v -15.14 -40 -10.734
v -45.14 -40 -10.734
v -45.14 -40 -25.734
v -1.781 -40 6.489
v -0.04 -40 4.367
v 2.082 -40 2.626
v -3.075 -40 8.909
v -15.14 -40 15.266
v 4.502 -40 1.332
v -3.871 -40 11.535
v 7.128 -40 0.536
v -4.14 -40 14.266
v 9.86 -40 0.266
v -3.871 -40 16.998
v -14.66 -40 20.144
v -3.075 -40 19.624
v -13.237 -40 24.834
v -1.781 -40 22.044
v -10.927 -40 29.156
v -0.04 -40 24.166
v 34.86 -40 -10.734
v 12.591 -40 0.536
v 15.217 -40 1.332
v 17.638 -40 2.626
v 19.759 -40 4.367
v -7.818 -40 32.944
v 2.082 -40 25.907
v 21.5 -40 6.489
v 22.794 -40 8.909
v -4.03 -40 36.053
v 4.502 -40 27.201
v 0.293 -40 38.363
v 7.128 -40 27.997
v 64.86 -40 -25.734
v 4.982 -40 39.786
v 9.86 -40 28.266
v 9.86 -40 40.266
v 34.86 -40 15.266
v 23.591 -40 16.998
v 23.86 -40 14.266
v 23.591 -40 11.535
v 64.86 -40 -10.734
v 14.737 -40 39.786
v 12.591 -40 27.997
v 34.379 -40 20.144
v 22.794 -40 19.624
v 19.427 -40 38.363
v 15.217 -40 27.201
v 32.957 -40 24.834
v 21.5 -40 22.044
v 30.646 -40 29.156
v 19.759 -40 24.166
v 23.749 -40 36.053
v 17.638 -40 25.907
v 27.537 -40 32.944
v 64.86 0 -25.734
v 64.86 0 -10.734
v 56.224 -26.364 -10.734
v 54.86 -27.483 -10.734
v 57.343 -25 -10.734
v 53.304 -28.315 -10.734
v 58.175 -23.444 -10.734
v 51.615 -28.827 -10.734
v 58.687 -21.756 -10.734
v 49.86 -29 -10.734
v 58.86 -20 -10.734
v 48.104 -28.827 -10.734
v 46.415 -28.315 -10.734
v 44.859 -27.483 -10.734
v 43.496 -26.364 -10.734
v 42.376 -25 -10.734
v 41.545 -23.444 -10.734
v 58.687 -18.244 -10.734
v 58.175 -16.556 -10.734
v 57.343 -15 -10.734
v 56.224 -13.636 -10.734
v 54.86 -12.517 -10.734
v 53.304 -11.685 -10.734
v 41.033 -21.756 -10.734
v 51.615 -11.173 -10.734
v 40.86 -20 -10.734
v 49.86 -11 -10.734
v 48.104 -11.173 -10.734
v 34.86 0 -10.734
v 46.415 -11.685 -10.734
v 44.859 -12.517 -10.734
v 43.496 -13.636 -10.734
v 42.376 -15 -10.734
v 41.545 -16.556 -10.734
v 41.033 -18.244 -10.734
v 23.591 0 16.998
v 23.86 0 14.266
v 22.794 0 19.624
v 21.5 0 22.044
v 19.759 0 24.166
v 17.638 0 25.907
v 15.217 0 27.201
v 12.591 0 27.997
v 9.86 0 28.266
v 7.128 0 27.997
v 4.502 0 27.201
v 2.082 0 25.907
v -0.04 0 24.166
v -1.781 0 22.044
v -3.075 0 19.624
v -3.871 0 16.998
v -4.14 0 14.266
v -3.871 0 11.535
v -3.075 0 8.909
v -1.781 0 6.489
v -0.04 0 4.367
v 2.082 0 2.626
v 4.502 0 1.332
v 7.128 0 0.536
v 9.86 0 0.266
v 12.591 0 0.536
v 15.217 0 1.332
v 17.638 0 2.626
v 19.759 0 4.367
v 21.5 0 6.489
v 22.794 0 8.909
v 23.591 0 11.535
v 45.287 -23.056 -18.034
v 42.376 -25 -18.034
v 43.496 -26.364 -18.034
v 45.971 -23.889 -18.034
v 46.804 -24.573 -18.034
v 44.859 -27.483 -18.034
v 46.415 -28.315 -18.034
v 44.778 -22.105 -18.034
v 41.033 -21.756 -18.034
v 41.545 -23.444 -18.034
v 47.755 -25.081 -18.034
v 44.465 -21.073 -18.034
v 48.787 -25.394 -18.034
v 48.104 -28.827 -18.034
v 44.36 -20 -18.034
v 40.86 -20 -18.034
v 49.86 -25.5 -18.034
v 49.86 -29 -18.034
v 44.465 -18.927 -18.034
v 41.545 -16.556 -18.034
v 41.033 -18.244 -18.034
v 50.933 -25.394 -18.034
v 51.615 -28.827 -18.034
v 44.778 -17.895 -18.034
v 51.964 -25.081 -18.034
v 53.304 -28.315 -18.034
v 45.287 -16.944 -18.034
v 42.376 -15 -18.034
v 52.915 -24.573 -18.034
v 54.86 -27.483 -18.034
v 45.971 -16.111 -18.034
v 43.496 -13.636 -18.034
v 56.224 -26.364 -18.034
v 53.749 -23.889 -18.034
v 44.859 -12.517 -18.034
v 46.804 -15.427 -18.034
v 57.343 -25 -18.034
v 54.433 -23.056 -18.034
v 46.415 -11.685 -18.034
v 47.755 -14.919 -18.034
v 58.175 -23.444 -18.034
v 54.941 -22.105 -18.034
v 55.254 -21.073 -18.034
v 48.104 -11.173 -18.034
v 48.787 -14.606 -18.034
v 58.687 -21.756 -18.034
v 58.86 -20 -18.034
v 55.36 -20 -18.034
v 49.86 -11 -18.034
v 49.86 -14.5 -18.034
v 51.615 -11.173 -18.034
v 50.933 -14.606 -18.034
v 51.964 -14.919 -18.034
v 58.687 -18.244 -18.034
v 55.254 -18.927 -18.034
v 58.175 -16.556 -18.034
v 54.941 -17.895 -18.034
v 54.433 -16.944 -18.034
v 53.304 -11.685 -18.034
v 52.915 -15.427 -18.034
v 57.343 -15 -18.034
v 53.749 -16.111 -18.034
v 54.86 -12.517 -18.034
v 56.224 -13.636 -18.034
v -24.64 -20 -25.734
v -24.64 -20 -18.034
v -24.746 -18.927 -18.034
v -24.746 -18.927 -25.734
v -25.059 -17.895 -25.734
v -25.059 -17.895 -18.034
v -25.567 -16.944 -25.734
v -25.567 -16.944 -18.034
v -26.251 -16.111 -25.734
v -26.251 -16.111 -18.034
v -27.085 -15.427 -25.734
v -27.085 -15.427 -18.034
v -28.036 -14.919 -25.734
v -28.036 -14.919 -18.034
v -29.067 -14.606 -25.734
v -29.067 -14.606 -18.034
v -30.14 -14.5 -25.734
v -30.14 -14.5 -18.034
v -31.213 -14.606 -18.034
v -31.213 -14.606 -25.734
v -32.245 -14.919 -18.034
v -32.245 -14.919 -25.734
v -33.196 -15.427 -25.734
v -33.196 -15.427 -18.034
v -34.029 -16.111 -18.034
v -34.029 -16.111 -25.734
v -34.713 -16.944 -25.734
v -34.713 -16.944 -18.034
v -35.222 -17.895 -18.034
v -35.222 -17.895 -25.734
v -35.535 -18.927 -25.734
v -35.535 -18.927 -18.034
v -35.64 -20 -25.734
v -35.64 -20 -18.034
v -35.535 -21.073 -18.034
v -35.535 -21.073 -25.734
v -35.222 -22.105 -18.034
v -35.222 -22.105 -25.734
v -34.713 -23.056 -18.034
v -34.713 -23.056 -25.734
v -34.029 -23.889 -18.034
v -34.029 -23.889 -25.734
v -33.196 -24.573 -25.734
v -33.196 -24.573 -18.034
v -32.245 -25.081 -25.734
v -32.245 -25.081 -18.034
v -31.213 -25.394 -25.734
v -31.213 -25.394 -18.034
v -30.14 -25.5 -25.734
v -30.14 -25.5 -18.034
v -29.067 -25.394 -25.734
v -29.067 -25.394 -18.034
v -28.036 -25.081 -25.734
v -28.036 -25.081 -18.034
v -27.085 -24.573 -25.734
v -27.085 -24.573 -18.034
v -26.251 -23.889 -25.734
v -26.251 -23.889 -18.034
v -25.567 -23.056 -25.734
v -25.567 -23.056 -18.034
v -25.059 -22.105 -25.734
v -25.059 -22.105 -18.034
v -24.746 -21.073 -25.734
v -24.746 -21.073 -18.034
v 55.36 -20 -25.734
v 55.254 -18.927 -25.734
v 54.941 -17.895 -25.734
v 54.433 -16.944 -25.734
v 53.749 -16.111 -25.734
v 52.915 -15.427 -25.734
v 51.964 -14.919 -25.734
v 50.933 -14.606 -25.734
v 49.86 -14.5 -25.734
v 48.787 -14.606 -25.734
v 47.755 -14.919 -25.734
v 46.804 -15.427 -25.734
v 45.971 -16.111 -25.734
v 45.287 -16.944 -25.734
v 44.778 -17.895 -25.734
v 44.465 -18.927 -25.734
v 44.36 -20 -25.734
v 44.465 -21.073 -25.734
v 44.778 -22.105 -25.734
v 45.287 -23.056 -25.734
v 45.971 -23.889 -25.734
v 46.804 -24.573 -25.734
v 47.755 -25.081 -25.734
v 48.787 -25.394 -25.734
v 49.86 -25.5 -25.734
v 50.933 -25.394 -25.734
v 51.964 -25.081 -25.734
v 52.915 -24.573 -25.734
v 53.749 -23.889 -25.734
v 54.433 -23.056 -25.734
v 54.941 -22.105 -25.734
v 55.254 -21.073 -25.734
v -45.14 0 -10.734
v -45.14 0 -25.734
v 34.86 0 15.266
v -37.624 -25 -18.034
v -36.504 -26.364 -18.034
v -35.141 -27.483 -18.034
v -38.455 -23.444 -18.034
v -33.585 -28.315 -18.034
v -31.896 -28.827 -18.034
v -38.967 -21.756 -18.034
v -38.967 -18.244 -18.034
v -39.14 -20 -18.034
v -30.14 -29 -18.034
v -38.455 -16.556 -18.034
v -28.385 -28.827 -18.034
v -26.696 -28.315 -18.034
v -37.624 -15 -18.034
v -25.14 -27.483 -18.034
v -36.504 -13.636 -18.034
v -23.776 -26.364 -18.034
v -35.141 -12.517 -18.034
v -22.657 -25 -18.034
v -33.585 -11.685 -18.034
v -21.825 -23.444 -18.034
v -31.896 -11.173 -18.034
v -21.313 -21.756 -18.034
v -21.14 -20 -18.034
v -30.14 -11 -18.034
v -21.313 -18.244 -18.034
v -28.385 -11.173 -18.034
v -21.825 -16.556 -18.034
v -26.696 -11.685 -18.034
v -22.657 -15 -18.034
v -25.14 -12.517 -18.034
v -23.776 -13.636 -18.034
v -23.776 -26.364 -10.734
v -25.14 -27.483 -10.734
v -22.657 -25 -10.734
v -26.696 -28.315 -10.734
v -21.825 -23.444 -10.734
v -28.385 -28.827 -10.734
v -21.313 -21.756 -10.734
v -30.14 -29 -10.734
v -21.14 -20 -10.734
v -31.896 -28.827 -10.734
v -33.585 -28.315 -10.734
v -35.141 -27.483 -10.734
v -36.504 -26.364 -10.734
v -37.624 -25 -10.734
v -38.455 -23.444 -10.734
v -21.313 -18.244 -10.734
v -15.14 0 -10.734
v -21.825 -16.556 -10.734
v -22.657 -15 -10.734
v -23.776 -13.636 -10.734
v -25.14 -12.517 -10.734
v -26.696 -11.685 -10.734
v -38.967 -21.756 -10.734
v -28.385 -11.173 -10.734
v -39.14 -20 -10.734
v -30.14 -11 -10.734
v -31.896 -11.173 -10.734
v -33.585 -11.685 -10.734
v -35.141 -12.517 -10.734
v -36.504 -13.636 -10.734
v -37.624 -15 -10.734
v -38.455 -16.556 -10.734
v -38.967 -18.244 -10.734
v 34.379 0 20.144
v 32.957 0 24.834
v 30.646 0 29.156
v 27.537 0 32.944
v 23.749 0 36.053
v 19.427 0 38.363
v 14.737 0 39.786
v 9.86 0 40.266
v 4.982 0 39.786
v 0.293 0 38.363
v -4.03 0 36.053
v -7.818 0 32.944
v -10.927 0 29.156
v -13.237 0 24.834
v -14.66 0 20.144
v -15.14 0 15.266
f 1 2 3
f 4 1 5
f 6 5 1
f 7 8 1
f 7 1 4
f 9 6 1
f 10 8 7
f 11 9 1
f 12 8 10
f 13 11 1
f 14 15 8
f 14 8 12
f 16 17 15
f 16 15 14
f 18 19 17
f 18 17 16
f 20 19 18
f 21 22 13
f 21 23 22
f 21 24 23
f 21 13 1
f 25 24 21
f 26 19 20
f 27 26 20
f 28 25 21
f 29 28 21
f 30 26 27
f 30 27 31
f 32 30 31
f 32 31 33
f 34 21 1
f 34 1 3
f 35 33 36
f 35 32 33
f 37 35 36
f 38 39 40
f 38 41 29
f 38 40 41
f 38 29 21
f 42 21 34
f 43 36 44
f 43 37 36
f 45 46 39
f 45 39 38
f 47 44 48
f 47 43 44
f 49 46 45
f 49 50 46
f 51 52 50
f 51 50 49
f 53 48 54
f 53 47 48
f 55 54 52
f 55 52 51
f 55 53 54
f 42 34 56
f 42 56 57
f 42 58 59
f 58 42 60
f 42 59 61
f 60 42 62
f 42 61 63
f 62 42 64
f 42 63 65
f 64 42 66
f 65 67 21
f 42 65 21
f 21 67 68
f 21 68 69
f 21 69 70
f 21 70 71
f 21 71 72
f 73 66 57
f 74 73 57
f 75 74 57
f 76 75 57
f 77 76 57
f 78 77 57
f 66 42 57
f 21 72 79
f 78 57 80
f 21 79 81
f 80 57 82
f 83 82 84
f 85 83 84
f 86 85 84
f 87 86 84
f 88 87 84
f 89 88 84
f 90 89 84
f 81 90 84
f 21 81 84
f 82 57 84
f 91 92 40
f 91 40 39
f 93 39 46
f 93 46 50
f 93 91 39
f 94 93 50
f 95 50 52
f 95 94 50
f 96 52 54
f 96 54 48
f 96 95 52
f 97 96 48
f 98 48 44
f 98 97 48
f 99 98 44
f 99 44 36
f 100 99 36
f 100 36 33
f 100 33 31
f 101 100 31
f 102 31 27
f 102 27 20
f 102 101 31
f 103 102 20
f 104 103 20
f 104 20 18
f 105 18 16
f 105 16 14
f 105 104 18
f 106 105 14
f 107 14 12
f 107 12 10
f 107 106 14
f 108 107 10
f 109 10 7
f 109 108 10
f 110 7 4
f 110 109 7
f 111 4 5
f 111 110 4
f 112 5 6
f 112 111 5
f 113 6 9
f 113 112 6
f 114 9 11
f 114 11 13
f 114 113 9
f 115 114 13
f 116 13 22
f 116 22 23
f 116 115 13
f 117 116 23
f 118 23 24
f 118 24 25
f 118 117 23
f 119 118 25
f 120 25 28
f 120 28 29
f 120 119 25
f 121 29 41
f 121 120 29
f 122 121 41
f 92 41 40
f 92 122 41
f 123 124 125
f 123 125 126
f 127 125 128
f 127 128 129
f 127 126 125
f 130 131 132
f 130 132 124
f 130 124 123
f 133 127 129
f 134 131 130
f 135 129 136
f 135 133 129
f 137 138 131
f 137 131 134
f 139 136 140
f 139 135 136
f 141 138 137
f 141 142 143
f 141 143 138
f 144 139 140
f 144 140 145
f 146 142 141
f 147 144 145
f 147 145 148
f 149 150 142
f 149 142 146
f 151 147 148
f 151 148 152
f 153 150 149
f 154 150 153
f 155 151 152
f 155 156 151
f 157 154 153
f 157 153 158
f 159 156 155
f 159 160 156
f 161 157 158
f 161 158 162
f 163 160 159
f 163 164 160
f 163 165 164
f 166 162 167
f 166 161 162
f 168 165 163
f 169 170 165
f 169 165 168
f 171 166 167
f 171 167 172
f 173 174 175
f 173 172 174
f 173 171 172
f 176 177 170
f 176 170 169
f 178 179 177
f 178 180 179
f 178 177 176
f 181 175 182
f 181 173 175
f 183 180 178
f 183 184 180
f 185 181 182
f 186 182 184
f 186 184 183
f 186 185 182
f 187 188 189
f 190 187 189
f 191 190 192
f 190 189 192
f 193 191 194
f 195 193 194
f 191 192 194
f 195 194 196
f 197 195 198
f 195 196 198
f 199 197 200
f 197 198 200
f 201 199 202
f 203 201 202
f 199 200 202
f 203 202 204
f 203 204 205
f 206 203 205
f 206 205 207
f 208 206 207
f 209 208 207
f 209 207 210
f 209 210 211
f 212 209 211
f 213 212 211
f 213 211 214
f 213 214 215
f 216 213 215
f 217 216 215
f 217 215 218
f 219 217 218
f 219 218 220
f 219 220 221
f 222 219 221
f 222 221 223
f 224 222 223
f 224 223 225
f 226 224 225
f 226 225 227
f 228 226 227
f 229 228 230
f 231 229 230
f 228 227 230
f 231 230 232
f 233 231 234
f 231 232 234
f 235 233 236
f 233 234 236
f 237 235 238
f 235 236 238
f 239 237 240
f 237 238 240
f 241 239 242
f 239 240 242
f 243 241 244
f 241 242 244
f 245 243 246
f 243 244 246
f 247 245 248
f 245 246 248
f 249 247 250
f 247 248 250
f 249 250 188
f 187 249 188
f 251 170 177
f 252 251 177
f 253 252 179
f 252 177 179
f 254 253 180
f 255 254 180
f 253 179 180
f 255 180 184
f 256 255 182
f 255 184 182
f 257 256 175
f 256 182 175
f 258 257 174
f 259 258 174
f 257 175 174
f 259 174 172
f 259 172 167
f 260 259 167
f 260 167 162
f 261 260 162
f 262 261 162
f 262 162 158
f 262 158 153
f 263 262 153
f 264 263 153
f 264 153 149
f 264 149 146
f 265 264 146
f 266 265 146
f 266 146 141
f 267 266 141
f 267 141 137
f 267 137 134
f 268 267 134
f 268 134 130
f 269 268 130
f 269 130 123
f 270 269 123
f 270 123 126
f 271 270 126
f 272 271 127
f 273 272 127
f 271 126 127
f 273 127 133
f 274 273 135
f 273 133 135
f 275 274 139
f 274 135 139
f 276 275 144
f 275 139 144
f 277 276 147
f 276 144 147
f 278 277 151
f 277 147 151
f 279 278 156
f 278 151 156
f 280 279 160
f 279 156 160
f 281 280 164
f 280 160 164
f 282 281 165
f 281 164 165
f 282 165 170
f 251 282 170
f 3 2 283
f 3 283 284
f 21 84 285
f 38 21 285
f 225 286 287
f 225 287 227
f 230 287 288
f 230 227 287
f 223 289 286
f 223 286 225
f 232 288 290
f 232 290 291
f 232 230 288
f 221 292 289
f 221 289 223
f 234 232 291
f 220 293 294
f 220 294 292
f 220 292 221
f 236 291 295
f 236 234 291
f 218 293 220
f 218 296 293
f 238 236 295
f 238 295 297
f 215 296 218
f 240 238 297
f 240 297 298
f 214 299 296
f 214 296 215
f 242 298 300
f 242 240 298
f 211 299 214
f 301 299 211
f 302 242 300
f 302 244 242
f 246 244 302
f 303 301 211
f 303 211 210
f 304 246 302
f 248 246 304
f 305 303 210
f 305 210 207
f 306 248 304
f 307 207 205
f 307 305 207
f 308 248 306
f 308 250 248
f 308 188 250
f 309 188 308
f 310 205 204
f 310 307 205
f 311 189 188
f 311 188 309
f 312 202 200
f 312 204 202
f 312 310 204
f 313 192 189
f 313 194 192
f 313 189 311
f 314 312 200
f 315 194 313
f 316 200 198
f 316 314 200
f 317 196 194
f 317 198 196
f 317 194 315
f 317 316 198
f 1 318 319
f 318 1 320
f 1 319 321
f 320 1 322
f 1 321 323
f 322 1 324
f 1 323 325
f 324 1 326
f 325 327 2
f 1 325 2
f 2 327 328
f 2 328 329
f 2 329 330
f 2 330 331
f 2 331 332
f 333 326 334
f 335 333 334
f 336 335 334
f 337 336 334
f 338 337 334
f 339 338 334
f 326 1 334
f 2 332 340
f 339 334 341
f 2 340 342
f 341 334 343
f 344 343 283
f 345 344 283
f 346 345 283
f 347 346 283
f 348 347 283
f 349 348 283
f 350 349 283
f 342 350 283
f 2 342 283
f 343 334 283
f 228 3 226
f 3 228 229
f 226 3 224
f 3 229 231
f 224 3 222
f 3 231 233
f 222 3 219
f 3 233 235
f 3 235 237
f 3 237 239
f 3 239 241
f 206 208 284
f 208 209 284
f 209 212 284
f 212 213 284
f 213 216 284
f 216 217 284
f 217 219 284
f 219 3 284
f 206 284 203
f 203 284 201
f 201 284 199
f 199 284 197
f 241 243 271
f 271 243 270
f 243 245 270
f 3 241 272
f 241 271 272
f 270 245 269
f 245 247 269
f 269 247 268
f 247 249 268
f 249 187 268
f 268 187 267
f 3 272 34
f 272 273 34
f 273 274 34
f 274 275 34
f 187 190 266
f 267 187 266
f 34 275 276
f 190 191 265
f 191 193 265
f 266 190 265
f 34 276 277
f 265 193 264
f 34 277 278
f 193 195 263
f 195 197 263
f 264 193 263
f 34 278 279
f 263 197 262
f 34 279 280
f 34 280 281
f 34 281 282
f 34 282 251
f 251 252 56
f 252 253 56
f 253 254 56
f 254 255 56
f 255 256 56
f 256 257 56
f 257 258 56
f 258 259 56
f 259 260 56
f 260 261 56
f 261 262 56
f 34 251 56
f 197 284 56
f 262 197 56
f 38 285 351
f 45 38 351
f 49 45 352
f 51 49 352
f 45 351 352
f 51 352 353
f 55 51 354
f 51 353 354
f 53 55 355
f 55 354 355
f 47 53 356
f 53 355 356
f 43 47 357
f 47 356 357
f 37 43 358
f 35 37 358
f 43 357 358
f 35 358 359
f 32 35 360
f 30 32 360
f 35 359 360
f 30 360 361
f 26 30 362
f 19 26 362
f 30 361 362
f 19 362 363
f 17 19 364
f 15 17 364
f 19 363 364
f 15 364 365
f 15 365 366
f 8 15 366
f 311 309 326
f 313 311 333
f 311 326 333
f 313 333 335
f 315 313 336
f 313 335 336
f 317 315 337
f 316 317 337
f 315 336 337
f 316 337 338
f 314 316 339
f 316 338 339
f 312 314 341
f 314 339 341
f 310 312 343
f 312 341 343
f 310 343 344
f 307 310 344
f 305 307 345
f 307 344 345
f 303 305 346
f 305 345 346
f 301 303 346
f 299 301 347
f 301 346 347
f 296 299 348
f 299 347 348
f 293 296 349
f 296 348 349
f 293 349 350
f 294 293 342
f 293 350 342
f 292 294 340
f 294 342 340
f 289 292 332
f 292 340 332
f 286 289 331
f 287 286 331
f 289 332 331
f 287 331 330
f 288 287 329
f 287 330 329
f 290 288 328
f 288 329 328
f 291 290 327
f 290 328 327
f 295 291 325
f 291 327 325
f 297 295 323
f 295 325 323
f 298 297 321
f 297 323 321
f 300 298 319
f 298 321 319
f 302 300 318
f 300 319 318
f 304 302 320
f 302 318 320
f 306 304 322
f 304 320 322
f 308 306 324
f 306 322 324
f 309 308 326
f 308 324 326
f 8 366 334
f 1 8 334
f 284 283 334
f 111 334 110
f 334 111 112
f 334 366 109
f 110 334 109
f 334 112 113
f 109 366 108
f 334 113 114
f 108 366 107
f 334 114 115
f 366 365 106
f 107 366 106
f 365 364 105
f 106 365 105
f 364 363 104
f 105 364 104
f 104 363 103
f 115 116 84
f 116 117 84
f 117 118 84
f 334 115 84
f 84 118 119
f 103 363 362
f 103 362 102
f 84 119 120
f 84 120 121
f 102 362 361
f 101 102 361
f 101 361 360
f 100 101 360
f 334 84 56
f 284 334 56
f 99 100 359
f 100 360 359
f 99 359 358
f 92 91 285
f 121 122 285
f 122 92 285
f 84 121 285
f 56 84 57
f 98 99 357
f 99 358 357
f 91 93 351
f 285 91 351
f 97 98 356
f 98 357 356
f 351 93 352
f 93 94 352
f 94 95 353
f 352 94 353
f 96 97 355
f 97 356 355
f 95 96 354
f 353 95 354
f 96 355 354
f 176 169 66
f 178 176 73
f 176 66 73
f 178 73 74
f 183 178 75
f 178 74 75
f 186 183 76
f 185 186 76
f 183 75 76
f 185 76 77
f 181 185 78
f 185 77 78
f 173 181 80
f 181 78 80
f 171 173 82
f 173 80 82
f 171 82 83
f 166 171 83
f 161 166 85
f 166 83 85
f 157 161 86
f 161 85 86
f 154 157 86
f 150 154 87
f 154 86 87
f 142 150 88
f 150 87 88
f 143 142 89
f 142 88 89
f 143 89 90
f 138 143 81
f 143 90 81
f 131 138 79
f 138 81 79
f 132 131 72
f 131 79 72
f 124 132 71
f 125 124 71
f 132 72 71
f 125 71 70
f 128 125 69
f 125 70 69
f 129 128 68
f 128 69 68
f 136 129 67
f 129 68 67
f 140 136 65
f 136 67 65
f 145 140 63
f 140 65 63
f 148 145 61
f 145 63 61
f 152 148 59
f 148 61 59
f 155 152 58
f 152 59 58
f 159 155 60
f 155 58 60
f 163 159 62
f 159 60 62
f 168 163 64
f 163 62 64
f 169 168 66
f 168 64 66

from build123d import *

# Parameters (mm, degrees)
F0_R     = 14
F1_DEPTH = 40
F2_R     = 9
F3_DEPTH = 7.3
F4_R     = 5.5
F5_R     = 5.5
F6_DEPTH = 25


with BuildPart() as f1:
    # F0 (on Front) → F1 (new body)
    with BuildSketch(Plane.XZ):
        with BuildLine():
            Line((-15.140404, -10.733506), (-45.140404, -10.733506))
            Line((-45.140404, -10.733506), (-45.140404, -25.733506))
            Line((-45.140404, -25.733506), (64.859596, -25.733506))
            Line((64.859596, -25.733506), (64.859596, -10.733506))
            Line((64.859596, -10.733506), (34.859596, -10.733506))
            Line((34.859596, -10.733506), (34.859596, 15.266494))
            ThreePointArc((34.859596, 15.266494), (9.859596, 40.266494), (-15.140404, 15.266494))
            Line((-15.140404, 15.266494), (-15.140404, -10.733506))
        make_face()
        with Locations((9.859596, 14.266494)):
            Circle(F0_R, mode=Mode.SUBTRACT)
    extrude(amount=F1_DEPTH)

    # F2 (on face) → F3 (cut)
    with BuildSketch(Plane.XY.offset(-10.733506)):
        with Locations((-30.140404, -20)):
            Circle(F2_R)
        with Locations((49.859596, -20)):
            Circle(F2_R)
    extrude(amount=-F3_DEPTH, mode=Mode.SUBTRACT)

    # F4 (on face) + F5 (on face) → F6 (cut)
    with BuildSketch(Plane.XY.offset(-18.033506)):
        with Locations((-30.140404, -20)):
            Circle(F4_R)
    with BuildSketch(Plane.XY.offset(-18.033506)):
        with Locations((49.859596, -20)):
            Circle(F5_R)
    extrude(amount=-F6_DEPTH, mode=Mode.SUBTRACT)


solid = f1.part
